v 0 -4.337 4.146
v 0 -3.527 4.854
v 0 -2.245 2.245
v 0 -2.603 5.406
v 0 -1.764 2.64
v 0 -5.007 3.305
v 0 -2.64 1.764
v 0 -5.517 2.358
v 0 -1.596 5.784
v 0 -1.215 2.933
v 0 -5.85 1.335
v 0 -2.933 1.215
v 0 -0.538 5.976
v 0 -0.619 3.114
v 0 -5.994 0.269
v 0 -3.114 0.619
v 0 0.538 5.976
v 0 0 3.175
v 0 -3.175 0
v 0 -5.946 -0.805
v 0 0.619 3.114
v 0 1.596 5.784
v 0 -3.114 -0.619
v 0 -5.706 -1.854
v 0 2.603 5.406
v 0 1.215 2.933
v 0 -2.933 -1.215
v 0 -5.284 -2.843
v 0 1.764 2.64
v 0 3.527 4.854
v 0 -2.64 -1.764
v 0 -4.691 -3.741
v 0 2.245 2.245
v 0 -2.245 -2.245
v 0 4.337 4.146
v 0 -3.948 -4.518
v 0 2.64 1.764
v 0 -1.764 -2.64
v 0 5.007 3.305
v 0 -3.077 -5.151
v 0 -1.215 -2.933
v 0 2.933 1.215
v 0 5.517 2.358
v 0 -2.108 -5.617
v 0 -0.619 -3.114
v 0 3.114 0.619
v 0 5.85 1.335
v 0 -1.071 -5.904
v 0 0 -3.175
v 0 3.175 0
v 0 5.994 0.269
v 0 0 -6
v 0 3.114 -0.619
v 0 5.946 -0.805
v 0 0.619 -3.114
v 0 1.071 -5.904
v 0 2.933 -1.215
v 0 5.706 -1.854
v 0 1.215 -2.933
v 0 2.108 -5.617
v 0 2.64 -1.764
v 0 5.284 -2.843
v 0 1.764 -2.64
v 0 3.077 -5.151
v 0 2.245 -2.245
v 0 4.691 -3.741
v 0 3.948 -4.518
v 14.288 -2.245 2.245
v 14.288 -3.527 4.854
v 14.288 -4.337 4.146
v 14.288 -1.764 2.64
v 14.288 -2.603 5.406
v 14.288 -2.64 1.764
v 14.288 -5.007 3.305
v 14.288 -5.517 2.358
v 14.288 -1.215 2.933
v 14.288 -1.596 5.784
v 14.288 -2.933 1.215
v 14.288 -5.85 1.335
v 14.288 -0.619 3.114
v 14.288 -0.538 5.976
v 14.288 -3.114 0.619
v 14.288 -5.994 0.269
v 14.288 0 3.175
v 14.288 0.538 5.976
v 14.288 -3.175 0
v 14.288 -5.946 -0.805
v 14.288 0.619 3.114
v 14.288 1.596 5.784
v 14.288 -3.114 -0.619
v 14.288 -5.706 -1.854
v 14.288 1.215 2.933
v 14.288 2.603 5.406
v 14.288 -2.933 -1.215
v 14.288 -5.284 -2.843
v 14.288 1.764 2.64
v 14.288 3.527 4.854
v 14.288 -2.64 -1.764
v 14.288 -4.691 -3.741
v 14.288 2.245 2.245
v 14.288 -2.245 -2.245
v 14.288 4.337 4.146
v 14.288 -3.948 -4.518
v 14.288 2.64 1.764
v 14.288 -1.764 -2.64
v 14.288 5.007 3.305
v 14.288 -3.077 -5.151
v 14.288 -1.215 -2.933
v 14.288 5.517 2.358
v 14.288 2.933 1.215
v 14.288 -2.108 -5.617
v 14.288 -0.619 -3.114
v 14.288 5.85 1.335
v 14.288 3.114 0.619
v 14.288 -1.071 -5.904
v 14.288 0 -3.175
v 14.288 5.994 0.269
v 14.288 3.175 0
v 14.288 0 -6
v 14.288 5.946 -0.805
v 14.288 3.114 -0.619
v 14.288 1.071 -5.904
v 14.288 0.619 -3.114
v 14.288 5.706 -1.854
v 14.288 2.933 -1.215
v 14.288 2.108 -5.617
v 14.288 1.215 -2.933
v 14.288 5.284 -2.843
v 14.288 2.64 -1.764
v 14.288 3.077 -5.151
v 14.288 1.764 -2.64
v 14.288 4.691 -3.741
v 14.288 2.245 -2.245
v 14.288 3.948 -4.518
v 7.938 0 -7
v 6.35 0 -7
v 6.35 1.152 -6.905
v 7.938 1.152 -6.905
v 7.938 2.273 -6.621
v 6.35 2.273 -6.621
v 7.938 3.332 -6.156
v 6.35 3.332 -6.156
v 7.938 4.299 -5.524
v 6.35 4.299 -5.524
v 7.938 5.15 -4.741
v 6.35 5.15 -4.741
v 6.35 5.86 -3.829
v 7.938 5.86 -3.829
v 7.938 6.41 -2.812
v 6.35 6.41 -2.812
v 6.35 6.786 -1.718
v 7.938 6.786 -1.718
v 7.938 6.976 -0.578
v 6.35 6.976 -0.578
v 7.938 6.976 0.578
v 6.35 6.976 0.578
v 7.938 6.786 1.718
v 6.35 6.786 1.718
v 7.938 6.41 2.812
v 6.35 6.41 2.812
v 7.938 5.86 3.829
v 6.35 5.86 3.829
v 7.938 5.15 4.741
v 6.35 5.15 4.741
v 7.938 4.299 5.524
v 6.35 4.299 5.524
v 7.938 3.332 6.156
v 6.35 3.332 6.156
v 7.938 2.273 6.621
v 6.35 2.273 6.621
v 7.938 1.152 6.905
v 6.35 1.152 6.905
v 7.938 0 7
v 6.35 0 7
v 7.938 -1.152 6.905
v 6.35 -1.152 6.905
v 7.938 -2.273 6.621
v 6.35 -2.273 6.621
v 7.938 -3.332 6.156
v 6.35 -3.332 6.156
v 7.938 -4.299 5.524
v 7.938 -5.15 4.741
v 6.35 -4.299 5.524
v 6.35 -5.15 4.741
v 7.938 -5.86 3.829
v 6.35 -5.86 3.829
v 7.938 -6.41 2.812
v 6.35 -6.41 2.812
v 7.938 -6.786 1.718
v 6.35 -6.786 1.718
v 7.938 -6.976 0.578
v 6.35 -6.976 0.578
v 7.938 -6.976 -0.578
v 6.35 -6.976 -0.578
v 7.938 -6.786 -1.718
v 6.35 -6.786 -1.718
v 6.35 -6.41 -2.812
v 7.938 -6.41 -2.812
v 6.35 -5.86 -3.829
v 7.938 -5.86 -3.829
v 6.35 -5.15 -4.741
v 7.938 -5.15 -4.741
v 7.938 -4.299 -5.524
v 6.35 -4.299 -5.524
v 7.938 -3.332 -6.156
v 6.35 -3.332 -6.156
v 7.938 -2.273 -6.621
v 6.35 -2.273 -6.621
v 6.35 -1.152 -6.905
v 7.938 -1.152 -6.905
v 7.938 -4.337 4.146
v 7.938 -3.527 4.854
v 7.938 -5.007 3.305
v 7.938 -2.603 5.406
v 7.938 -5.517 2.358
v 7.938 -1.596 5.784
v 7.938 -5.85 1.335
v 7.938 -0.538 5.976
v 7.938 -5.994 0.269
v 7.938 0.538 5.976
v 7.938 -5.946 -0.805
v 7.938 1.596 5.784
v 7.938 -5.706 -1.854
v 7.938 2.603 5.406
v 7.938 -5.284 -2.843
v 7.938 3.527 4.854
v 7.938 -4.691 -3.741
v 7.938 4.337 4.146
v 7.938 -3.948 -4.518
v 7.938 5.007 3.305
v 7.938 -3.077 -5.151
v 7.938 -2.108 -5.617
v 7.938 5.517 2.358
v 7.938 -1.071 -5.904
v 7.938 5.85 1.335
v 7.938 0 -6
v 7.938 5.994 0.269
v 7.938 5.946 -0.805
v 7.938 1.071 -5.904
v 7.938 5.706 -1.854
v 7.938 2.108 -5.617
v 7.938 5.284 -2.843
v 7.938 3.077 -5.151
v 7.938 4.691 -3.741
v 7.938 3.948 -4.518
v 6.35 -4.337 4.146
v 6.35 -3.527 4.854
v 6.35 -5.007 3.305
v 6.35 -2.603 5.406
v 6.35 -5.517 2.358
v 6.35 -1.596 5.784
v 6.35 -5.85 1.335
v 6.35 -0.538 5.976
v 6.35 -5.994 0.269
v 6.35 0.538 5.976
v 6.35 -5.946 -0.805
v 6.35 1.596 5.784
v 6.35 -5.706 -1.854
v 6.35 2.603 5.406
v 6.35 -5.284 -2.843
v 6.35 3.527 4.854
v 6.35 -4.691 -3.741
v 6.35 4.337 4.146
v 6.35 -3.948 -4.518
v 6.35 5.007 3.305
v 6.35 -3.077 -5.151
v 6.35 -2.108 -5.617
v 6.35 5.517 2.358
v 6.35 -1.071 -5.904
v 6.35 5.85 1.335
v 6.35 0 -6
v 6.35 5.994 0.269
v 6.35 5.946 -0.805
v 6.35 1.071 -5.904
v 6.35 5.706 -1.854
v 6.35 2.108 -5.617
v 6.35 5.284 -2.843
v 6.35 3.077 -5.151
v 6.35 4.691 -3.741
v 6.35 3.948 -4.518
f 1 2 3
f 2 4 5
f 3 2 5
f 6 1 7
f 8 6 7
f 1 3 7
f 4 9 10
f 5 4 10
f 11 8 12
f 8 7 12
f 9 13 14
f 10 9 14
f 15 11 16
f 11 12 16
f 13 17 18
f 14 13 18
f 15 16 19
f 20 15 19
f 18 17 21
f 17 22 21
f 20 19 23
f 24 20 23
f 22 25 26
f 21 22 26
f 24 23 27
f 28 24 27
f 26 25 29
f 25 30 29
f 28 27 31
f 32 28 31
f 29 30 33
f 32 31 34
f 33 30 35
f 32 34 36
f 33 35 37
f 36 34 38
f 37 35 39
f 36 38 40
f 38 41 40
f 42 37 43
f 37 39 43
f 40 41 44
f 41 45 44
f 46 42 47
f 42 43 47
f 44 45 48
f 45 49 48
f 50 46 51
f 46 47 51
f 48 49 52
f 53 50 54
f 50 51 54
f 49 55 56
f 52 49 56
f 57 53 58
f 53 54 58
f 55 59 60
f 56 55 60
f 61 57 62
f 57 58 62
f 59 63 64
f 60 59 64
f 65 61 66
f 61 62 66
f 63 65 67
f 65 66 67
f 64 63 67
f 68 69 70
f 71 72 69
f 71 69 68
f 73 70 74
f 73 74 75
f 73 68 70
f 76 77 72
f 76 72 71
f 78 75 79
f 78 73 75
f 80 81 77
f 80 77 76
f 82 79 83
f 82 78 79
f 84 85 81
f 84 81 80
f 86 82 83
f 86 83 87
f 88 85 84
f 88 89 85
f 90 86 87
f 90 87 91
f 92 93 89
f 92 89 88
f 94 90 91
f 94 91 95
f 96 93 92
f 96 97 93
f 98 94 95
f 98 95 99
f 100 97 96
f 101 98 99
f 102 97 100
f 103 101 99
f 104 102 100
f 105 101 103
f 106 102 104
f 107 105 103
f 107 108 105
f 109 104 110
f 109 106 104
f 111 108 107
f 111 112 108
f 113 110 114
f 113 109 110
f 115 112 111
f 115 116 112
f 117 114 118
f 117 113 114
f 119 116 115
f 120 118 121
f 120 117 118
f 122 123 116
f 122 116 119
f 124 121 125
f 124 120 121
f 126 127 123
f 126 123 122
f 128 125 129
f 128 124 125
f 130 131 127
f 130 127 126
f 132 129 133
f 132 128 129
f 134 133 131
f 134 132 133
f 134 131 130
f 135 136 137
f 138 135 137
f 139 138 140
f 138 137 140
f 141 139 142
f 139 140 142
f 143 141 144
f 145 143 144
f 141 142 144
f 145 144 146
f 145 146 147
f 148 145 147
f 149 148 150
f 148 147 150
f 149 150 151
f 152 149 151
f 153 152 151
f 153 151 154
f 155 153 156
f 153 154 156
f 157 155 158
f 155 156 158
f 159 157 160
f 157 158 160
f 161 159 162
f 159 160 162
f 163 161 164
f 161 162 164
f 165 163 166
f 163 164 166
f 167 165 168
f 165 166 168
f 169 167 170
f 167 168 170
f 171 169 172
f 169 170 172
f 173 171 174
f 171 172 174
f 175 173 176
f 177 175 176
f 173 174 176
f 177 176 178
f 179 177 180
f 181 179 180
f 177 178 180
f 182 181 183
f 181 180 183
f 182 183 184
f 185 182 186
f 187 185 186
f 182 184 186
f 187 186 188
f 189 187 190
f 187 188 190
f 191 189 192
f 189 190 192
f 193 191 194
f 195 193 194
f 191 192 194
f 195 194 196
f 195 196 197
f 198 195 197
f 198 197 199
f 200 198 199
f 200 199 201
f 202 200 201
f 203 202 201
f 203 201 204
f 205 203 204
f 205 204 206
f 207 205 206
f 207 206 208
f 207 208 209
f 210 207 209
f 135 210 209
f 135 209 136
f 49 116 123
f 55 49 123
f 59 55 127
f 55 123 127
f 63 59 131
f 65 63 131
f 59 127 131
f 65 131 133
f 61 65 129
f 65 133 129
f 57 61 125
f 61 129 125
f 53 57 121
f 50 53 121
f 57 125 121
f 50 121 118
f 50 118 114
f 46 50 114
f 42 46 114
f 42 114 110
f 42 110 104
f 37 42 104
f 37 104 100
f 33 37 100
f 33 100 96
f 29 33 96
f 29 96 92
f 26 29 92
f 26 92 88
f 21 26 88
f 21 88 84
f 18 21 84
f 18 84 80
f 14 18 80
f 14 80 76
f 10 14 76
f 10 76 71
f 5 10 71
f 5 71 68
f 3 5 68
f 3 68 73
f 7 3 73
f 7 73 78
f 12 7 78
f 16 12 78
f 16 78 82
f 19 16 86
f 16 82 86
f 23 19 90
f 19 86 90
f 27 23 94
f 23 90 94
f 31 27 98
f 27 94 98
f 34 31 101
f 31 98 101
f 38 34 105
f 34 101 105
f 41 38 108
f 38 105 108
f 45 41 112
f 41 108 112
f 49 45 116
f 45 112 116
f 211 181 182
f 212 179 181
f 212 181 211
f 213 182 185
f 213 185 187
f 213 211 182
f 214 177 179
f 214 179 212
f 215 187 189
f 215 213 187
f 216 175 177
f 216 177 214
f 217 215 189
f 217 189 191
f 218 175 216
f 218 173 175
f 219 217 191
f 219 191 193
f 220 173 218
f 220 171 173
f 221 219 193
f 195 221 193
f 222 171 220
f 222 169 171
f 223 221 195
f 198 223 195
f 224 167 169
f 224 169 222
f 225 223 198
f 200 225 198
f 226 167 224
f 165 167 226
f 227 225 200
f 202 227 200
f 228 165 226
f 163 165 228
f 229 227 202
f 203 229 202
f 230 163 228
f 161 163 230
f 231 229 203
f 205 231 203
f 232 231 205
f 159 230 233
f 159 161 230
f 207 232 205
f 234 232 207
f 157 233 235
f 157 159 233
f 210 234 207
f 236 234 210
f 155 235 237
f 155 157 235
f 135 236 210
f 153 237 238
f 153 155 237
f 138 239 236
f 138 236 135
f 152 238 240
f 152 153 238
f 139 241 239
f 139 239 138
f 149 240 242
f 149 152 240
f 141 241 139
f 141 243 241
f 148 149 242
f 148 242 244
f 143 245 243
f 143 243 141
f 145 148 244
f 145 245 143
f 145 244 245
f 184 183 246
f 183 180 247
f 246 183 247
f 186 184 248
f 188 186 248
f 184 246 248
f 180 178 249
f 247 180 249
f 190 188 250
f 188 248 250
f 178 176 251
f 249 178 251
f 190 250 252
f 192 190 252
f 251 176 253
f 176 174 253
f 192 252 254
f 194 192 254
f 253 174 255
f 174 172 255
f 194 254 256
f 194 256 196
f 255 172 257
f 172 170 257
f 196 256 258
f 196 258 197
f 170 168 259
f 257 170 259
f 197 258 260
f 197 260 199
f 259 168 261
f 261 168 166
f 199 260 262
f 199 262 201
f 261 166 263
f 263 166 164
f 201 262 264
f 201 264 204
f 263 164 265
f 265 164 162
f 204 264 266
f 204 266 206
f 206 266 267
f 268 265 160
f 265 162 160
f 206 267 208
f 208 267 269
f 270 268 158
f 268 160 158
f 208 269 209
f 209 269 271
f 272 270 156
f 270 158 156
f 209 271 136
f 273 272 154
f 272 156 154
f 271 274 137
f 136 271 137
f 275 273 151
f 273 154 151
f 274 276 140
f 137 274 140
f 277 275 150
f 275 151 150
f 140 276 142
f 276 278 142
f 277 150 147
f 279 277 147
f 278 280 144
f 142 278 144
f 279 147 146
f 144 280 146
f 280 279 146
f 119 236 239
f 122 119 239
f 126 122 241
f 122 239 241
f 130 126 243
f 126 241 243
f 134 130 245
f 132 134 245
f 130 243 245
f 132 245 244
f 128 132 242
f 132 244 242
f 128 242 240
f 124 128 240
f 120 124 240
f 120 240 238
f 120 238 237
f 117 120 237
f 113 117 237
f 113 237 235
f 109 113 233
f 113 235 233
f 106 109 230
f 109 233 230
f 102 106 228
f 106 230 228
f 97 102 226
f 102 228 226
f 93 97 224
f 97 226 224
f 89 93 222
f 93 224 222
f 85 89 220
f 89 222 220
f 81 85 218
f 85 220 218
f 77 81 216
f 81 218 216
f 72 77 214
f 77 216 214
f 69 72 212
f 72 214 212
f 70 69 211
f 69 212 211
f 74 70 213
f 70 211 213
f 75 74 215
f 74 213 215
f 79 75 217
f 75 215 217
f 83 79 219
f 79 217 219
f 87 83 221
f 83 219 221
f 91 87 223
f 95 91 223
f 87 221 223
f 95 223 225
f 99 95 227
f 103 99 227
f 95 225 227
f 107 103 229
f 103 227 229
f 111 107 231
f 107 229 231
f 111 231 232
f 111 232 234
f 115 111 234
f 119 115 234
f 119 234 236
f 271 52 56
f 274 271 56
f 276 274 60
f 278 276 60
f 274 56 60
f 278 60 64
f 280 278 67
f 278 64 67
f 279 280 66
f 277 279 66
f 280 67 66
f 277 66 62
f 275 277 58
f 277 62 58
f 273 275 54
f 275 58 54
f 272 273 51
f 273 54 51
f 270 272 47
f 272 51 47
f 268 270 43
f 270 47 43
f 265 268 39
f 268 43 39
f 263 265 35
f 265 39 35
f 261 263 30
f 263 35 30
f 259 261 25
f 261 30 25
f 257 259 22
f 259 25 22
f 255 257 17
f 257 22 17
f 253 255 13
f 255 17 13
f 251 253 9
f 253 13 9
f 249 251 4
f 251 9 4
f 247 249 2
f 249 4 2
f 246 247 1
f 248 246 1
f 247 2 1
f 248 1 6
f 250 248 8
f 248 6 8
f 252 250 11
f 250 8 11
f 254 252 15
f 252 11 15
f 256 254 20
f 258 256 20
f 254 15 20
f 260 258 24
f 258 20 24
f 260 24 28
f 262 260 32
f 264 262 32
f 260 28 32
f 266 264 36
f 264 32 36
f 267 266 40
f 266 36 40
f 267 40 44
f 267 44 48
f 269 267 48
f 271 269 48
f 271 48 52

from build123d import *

# Parameters (mm, degrees)
SKETCH1_R           = 5.999999938
BOSS_EXTRUDE1_DEPTH = 6.35
SKETCH2_R           = 6.99999997
BOSS_EXTRUDE2_DEPTH = 1.5875
SKETCH3_R           = 5.999999938
BOSS_EXTRUDE3_DEPTH = 6.35
SKETCH4_R           = 3.175
CUT_EXTRUDE1_DEPTH  = 15.2875


with BuildPart() as part:
    # Sketch1 → Boss-Extrude1 (new body)
    with BuildSketch(Plane(origin=(0, 0, 0), x_dir=(0, 0, -1), z_dir=(1, 0, 0))):
        Circle(SKETCH1_R)
    extrude(amount=BOSS_EXTRUDE1_DEPTH)

    # Sketch2 → Boss-Extrude2 (add)
    with BuildSketch(Plane(origin=(6.35, 0, 0), x_dir=(0, 0, -1), z_dir=(1, 0, 0))):
        Circle(SKETCH2_R)
    extrude(amount=BOSS_EXTRUDE2_DEPTH)

    # Sketch3 → Boss-Extrude3 (add)
    with BuildSketch(Plane(origin=(7.9375, 0, 0), x_dir=(0, 0, -1), z_dir=(1, 0, 0))):
        Circle(SKETCH3_R)
    extrude(amount=BOSS_EXTRUDE3_DEPTH)

    # Sketch4 → Cut-Extrude1 (cut, through all)
    with BuildSketch(Plane(origin=(14.2875, 0, 0), x_dir=(0, 0, -1), z_dir=(1, 0, 0))):
        Circle(SKETCH4_R)
    extrude(amount=-CUT_EXTRUDE1_DEPTH, mode=Mode.SUBTRACT)


solid = part.part
